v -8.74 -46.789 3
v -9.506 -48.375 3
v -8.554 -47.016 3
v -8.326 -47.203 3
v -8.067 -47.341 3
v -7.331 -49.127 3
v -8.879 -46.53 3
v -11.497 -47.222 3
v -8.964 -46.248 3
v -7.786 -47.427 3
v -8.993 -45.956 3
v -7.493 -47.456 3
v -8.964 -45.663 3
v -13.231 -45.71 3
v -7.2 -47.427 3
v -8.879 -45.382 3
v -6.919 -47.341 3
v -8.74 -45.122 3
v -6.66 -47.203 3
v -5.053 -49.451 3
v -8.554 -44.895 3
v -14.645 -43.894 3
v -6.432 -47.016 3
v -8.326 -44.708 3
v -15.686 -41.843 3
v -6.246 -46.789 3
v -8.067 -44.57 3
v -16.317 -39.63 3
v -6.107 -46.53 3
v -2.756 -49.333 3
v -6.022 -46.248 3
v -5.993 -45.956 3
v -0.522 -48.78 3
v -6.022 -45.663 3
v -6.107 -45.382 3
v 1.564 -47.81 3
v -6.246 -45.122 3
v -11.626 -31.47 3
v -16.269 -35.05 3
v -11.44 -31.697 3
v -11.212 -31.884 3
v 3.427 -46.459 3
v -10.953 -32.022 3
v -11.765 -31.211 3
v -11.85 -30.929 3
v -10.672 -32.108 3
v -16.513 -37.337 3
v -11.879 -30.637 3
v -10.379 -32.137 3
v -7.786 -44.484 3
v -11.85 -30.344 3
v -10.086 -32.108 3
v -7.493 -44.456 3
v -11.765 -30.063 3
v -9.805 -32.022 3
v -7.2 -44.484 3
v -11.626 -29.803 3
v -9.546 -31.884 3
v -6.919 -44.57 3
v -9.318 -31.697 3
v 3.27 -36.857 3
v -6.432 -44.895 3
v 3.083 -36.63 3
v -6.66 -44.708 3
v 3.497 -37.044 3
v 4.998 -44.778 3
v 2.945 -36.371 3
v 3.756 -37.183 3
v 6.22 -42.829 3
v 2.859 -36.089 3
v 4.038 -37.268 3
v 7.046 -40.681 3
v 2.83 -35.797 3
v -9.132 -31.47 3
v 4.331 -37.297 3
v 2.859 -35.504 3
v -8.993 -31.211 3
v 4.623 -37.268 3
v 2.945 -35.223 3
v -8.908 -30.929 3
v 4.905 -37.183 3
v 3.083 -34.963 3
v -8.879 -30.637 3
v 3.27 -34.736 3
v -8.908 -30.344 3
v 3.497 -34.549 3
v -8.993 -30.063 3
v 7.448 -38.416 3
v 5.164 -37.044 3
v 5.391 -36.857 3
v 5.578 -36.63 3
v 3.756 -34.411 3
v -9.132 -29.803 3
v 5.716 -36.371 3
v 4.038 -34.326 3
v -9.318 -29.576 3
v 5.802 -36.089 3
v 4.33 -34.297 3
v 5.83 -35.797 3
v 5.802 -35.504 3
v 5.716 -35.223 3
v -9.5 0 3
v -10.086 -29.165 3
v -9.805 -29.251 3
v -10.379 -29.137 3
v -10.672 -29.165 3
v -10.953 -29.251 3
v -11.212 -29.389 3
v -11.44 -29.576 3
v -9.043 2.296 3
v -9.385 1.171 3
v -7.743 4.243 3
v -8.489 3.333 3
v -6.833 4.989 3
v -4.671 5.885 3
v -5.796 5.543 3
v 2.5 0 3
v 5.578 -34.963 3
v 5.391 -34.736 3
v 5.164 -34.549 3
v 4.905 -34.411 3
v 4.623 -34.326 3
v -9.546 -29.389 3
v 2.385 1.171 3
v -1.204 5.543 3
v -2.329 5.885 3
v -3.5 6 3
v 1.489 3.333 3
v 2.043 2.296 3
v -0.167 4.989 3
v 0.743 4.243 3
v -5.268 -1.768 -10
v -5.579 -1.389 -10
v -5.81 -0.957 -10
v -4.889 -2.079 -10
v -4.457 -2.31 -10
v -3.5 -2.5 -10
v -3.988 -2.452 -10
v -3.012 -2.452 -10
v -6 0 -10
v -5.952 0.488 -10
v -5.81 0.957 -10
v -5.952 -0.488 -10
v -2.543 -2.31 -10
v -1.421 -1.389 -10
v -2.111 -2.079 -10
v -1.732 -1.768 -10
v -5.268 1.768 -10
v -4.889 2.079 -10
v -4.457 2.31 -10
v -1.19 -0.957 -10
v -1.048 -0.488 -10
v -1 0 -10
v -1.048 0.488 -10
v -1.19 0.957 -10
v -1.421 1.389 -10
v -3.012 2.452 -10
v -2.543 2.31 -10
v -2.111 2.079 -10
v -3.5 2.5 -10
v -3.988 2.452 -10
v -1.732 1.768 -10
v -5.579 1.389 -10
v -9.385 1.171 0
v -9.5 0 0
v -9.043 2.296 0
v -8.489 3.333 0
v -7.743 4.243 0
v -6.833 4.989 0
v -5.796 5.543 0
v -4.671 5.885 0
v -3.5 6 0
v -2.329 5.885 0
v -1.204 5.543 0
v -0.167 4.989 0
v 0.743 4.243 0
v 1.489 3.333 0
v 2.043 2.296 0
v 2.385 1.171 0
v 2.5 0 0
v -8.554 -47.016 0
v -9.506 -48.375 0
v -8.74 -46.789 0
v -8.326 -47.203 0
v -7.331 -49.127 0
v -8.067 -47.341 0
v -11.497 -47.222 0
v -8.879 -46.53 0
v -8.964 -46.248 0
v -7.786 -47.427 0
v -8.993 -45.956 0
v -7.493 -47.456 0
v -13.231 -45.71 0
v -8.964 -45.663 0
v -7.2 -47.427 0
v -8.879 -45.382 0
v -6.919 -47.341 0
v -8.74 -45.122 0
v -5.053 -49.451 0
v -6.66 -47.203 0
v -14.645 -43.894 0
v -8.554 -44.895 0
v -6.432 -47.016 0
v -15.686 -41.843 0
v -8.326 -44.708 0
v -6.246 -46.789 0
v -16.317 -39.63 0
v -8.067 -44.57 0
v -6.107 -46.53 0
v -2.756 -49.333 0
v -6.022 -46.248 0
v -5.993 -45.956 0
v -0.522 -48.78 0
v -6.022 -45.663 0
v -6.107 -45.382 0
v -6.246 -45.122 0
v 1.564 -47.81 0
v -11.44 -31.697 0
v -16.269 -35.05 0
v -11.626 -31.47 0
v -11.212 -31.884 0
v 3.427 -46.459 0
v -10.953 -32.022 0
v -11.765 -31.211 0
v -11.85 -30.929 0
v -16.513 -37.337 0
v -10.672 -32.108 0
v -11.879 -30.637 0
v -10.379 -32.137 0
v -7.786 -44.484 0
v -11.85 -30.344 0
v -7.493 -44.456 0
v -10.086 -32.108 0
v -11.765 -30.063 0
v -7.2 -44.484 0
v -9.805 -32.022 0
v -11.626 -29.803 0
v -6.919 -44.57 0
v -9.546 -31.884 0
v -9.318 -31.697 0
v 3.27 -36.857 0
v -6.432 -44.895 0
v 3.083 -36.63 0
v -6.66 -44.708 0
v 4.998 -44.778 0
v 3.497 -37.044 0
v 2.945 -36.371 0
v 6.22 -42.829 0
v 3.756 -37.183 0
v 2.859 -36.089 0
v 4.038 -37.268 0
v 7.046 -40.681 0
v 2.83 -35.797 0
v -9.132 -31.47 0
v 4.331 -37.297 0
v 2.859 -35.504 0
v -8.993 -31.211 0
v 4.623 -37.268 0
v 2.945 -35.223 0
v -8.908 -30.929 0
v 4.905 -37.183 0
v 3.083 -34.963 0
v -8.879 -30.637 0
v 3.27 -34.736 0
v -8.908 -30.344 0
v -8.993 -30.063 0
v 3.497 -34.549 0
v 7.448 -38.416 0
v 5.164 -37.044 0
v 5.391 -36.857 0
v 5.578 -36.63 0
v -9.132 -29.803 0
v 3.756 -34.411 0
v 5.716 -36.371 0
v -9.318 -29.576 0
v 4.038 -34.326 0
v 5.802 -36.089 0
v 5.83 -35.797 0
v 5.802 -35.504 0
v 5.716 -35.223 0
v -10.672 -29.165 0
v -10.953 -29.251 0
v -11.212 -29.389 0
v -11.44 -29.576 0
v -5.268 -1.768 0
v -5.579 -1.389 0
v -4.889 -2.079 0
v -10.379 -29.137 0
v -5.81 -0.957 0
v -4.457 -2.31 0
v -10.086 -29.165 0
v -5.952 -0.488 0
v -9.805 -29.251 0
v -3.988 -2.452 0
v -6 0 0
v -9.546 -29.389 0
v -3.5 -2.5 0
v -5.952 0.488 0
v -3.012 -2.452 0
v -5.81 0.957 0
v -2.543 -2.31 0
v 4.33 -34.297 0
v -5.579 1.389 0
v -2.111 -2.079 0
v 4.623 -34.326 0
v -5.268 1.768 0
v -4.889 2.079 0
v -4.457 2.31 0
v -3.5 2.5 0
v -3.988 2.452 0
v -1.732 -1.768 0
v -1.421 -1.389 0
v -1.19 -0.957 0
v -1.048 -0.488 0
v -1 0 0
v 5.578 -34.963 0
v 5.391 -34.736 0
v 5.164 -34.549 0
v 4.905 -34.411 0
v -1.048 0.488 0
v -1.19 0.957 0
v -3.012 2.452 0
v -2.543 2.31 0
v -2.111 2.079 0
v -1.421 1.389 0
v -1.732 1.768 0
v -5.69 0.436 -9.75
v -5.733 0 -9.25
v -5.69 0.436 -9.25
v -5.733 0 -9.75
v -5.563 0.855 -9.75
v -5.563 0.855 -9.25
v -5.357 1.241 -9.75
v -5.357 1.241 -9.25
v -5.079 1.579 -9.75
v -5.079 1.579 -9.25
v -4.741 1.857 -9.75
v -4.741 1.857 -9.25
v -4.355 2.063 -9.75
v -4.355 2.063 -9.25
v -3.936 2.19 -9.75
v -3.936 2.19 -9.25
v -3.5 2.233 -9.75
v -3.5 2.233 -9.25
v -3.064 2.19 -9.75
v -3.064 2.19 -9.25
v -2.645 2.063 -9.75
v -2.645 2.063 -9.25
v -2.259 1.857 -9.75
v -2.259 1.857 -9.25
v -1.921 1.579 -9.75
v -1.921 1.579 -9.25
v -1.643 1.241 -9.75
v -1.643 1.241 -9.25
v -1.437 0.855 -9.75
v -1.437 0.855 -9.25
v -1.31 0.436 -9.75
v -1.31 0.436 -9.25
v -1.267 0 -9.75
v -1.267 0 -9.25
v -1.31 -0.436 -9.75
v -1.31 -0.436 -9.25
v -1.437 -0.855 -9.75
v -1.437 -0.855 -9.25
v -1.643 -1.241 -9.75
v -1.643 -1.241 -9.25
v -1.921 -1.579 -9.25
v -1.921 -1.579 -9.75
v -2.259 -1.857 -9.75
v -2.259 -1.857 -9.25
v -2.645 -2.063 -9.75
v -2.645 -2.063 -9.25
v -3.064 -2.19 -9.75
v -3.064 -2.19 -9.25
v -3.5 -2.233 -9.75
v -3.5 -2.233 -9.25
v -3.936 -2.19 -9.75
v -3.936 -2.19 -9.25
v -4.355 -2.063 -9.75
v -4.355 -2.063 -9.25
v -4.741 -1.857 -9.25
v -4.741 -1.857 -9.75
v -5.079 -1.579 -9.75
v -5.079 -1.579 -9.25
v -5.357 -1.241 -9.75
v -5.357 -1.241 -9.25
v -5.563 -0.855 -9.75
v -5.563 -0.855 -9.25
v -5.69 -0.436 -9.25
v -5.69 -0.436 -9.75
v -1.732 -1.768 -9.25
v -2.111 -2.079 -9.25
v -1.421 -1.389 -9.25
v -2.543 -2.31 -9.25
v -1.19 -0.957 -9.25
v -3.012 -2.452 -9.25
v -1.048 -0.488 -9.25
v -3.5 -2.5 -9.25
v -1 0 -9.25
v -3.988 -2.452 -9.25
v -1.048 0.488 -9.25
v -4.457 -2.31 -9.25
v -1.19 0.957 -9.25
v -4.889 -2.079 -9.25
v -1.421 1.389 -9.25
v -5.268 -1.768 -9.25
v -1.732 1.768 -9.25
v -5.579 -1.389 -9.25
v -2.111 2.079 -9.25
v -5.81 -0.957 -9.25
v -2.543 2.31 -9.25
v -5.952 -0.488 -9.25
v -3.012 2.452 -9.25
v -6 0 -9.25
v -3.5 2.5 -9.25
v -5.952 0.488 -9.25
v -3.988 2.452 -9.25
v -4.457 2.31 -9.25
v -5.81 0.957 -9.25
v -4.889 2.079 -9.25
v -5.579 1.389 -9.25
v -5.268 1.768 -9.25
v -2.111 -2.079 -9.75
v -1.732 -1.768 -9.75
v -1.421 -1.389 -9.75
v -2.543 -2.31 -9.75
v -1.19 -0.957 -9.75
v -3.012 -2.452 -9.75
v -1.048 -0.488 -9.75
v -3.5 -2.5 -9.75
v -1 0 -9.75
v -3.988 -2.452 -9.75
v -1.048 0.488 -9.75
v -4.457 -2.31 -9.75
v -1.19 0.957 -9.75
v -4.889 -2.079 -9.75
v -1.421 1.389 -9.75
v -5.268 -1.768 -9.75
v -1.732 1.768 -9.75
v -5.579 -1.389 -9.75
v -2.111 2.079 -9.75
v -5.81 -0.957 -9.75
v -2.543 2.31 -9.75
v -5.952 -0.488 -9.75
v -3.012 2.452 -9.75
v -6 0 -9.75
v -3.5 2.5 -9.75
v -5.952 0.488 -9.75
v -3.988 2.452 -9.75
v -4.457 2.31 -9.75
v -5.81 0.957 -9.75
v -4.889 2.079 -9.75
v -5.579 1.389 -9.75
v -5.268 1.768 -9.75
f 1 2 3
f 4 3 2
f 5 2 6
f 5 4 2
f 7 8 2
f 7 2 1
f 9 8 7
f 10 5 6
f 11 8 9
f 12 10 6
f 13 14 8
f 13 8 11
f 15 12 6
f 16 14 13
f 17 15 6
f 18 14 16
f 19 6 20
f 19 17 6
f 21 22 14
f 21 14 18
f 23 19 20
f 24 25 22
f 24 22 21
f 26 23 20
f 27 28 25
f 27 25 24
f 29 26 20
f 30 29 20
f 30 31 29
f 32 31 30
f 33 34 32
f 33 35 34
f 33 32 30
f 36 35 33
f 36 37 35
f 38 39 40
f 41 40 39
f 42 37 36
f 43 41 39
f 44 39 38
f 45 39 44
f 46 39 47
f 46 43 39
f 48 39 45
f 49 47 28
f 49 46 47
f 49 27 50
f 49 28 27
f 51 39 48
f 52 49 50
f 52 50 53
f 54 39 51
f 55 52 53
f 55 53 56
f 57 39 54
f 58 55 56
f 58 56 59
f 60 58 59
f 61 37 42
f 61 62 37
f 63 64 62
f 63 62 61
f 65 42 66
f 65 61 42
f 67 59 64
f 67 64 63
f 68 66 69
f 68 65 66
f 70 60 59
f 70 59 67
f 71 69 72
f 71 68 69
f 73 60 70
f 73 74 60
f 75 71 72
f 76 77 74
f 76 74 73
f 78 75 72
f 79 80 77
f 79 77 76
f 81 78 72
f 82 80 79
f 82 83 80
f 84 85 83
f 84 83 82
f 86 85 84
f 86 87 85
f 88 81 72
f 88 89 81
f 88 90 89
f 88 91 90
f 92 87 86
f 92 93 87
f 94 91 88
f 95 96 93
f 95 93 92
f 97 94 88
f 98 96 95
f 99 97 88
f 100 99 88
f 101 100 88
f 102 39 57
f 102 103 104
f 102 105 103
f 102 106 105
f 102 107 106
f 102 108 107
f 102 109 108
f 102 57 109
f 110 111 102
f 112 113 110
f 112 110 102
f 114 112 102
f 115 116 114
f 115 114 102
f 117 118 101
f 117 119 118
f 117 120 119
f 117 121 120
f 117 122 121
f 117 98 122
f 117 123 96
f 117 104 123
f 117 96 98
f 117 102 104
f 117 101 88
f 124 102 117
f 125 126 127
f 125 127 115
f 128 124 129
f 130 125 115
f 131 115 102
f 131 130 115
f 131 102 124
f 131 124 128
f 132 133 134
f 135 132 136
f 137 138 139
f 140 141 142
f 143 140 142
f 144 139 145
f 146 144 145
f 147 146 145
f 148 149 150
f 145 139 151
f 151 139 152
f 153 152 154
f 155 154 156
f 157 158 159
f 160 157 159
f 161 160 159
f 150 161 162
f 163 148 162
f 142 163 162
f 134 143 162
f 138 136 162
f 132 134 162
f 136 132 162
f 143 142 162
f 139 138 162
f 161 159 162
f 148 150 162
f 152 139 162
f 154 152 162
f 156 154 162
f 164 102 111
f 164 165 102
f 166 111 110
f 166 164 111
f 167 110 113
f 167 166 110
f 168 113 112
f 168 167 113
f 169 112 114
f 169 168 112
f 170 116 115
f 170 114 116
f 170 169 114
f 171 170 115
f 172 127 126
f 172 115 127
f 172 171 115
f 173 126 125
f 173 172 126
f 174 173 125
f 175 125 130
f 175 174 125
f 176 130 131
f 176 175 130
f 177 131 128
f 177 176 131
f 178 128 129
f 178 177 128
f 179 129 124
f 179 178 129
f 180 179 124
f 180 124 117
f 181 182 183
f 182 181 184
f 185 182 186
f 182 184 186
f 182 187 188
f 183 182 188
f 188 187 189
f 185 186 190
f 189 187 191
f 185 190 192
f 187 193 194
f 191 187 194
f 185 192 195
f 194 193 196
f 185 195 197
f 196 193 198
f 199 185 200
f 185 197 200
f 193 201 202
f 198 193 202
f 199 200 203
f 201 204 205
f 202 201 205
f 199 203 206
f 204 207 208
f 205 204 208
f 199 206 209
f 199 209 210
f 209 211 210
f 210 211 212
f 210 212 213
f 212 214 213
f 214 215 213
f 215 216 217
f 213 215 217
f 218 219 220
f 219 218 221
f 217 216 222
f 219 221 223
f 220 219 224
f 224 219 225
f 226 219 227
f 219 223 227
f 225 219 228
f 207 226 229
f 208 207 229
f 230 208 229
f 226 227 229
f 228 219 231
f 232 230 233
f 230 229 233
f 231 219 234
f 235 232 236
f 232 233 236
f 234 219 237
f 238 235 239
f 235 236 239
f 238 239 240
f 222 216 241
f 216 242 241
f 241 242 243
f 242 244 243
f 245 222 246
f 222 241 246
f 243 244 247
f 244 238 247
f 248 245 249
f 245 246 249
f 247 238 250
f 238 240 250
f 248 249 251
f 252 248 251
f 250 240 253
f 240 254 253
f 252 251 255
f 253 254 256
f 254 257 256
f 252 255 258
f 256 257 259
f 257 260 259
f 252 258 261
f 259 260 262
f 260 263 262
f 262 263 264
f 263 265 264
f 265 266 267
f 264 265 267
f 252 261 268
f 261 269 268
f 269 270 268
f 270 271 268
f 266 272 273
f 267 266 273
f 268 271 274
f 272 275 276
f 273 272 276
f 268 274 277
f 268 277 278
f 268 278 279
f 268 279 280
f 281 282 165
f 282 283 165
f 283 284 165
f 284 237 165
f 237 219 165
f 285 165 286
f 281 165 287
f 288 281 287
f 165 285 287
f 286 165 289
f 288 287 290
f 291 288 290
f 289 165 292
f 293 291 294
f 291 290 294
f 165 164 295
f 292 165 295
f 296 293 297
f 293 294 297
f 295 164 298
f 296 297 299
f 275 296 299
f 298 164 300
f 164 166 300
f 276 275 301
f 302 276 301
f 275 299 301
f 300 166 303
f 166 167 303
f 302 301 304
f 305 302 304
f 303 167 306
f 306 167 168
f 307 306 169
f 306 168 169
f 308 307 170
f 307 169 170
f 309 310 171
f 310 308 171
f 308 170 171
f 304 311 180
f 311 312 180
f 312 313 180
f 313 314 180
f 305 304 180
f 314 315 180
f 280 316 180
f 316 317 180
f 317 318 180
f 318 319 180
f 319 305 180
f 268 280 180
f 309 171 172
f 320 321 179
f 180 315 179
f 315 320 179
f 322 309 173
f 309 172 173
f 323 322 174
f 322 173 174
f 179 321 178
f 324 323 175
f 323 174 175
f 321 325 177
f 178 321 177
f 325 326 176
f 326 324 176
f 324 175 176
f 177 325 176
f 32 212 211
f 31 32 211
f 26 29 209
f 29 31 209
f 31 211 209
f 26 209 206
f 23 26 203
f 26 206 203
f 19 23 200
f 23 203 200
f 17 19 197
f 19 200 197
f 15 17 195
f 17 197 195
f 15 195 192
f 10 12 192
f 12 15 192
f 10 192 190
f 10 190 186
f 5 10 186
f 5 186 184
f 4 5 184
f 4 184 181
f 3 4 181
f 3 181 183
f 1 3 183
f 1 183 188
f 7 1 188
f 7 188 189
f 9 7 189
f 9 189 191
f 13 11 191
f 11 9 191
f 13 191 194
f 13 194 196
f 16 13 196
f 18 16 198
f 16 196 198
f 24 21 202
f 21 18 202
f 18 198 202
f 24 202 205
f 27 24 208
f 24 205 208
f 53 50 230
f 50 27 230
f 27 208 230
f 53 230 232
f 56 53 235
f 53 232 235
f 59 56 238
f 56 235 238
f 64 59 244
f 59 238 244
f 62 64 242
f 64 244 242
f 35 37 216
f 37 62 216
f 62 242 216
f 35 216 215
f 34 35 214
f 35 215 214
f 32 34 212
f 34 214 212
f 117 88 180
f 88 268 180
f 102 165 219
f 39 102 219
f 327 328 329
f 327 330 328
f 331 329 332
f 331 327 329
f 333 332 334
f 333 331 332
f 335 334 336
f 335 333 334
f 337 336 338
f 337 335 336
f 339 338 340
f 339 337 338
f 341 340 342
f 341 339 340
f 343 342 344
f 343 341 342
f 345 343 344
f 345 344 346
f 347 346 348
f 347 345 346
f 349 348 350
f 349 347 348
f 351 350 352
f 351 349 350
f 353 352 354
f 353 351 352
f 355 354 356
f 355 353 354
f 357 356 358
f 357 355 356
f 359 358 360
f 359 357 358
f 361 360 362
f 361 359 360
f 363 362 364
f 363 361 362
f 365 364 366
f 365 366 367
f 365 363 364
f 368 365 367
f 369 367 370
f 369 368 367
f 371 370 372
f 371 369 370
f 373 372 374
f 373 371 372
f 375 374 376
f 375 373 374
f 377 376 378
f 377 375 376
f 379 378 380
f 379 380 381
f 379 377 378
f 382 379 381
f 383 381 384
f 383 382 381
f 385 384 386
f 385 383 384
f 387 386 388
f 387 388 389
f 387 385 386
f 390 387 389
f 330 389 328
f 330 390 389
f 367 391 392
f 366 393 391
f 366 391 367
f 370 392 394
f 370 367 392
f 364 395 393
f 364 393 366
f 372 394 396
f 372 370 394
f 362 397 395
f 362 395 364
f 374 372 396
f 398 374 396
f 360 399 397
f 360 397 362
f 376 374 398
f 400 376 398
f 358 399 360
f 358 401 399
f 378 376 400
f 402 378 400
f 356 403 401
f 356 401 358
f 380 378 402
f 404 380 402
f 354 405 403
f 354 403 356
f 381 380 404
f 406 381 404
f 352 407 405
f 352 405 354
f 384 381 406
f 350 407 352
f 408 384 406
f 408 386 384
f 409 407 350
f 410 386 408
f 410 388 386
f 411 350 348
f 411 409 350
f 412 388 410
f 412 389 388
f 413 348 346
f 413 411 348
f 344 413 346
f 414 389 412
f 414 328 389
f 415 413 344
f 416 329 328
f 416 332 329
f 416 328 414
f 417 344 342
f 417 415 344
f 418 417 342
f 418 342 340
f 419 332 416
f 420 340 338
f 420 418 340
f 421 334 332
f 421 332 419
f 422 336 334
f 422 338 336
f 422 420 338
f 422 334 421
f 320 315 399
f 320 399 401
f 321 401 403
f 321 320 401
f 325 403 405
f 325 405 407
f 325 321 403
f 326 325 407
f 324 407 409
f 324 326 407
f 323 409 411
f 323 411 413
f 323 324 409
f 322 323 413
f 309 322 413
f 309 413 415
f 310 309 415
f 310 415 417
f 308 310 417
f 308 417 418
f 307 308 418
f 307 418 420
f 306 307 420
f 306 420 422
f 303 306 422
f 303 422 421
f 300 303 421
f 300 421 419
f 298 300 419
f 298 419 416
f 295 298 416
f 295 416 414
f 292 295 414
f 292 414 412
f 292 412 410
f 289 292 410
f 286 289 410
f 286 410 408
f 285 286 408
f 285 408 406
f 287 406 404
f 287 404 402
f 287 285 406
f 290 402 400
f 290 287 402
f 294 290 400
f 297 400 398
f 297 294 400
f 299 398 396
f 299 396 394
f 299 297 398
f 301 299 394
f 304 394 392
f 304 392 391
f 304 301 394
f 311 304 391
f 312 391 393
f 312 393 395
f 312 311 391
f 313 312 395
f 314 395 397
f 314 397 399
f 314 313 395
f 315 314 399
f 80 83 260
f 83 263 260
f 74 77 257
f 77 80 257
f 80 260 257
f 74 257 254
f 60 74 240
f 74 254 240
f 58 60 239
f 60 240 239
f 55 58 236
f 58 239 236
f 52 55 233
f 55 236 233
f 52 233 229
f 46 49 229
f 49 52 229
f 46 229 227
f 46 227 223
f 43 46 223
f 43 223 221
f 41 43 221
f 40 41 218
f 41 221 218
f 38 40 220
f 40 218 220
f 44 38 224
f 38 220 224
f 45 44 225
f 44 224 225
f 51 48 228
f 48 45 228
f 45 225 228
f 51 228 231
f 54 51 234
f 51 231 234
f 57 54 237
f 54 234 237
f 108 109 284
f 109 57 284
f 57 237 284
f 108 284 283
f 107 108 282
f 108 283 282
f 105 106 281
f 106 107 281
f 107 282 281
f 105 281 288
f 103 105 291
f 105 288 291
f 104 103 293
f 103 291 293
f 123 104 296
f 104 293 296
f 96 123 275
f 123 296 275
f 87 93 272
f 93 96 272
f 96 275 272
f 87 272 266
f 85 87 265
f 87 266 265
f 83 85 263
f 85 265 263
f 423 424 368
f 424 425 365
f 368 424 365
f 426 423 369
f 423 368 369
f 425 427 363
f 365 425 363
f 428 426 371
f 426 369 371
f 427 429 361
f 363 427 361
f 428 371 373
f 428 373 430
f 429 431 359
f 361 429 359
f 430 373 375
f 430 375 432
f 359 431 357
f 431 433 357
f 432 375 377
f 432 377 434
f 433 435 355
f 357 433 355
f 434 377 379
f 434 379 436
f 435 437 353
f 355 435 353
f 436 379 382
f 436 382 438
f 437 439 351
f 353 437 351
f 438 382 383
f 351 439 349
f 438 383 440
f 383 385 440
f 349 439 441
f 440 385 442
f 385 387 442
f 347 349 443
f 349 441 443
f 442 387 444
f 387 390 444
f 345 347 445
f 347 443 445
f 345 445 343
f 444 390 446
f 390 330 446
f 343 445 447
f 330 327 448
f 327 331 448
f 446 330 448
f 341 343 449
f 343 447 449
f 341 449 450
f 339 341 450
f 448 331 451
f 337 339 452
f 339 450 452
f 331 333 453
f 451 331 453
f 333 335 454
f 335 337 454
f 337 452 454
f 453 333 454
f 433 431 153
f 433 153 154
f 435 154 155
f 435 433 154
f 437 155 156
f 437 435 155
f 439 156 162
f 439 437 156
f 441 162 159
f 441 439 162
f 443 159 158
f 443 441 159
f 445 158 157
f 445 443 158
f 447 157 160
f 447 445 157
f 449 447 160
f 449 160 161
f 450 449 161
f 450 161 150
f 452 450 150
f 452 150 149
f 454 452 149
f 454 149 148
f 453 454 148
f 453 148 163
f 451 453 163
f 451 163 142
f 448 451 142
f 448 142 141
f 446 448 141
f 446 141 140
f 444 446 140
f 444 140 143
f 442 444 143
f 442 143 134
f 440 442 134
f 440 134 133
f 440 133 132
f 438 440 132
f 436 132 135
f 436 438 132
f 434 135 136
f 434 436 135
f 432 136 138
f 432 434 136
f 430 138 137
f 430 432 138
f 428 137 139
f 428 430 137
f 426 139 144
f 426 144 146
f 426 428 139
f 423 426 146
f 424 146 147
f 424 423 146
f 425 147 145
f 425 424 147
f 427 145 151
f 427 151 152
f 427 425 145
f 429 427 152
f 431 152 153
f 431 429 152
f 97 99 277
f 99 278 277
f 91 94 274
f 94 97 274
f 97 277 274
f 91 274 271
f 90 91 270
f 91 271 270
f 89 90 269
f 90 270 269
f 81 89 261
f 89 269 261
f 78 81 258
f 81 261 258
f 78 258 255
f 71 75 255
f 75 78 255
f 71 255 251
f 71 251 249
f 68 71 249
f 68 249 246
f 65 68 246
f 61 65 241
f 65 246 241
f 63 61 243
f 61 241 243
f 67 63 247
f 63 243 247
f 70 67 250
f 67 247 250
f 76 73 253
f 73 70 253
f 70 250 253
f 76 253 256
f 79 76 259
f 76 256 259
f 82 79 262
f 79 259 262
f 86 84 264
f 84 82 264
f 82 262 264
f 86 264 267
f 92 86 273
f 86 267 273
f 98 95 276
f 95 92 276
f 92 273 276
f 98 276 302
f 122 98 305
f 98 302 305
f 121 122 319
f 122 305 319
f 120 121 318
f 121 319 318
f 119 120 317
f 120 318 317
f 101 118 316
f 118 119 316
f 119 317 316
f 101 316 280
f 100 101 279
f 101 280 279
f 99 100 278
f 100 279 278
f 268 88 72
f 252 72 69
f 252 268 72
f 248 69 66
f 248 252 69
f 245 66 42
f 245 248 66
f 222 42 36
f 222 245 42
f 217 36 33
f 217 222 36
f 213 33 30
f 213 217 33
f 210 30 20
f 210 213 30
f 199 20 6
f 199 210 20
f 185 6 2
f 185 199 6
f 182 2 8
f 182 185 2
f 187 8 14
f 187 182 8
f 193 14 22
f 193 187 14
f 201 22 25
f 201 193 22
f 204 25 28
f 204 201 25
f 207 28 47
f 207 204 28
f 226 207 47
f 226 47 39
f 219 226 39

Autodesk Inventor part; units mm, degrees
ref_plane "YZ Plane" through (0, 0, 0) normal (1, 0, 0) x (0, 1, 0)
ref_plane "XZ Plane" through (0, 0, 0) normal (0, 1, 0) x (-1, 0, 0)
sketch "Esquisse1" plane through (0, 0, 0) normal (0, 0, 1) x (1, 0, 0)
  circle A0 centre (-3.5, 0) radius 2.5 projected
  circle A1 centre (-3.5, 0) radius 2.5
  point P0 (0, 0)
ref_plane "Plan de construction1" through (-13, -9.5, -10) normal (0, 0, -1) x (0, 1, 0)
extrude "Extrusion1" add sketch "Esquisse1" against normal up to surface (10 mm away)
ref_plane "Plan de construction2" through (-3.5, 0, -9.5) normal (0, 0, -1) x (-1, 0, 0)
sketch "Esquisse2" plane through (-3.5, 0, -9.5) normal (0, 0, -1) x (-1, 0, 0)
  circle A0 centre (0, 0) radius 2.5
  circle A1 centre (0, 0) radius 2.2333
  point P0 (-3.5, 0)
extrude "Extrusion2" cut sketch "Esquisse2" along normal mid plane 0.5
sketch "Esquisxse8" plane through (-3.5, 0, 0) normal (0, 0, 1) x (1, 0, 0)
  circle A0 centre (-1.0139, -37.4629) radius 12 projected
  circle A1 centre (-6.8791, -30.6366) radius 1.5 projected
  circle A2 centre (-3.9931, -45.9556) radius 1.5 projected
  circle A3 centre (7.8305, -35.7967) radius 1.5 projected
  circle A4 centre (0, 0) radius 2.5 projected
  arc A5 (6, 0) -> (-6, 0) centre (0, 0) ccw
  arc A6 (-12.7687, -35.0496) -> (10.3163, -33.5099) centre (-1.0139, -37.4629) ccw
  circle A7 centre (-3.9931, -45.9556) radius 1.5
  circle A8 centre (-6.8791, -30.6366) radius 1.5
  circle A9 centre (7.8305, -35.7967) radius 1.5
  line L0 (10.9482, -38.4158) -> (6, 0)
  line L1 (-6, 0) -> (-12.8221, -35.3258)
  point P0 (3.5, 0)
  dimension "d15" = 12
extrude "Extrusion6" add sketch "Esquisxse8" along normal blind 3 contours L0 A0 | A0 L1 A5 L0 picked at (-1.038, -37.5266)
sketch "Esquisse9" plane through (-3.5, 0, 3) normal (0, 0, 1) x (1, 0, 0)
  circle A0 centre (0, 0) radius 2.5 projected
  circle A1 centre (0, 0) radius 2.5
  point P0 (3.5, 0)
extrude "Extrusion7" add sketch "Esquisse9" against normal blind 10
properties part number "bras_codeur"
